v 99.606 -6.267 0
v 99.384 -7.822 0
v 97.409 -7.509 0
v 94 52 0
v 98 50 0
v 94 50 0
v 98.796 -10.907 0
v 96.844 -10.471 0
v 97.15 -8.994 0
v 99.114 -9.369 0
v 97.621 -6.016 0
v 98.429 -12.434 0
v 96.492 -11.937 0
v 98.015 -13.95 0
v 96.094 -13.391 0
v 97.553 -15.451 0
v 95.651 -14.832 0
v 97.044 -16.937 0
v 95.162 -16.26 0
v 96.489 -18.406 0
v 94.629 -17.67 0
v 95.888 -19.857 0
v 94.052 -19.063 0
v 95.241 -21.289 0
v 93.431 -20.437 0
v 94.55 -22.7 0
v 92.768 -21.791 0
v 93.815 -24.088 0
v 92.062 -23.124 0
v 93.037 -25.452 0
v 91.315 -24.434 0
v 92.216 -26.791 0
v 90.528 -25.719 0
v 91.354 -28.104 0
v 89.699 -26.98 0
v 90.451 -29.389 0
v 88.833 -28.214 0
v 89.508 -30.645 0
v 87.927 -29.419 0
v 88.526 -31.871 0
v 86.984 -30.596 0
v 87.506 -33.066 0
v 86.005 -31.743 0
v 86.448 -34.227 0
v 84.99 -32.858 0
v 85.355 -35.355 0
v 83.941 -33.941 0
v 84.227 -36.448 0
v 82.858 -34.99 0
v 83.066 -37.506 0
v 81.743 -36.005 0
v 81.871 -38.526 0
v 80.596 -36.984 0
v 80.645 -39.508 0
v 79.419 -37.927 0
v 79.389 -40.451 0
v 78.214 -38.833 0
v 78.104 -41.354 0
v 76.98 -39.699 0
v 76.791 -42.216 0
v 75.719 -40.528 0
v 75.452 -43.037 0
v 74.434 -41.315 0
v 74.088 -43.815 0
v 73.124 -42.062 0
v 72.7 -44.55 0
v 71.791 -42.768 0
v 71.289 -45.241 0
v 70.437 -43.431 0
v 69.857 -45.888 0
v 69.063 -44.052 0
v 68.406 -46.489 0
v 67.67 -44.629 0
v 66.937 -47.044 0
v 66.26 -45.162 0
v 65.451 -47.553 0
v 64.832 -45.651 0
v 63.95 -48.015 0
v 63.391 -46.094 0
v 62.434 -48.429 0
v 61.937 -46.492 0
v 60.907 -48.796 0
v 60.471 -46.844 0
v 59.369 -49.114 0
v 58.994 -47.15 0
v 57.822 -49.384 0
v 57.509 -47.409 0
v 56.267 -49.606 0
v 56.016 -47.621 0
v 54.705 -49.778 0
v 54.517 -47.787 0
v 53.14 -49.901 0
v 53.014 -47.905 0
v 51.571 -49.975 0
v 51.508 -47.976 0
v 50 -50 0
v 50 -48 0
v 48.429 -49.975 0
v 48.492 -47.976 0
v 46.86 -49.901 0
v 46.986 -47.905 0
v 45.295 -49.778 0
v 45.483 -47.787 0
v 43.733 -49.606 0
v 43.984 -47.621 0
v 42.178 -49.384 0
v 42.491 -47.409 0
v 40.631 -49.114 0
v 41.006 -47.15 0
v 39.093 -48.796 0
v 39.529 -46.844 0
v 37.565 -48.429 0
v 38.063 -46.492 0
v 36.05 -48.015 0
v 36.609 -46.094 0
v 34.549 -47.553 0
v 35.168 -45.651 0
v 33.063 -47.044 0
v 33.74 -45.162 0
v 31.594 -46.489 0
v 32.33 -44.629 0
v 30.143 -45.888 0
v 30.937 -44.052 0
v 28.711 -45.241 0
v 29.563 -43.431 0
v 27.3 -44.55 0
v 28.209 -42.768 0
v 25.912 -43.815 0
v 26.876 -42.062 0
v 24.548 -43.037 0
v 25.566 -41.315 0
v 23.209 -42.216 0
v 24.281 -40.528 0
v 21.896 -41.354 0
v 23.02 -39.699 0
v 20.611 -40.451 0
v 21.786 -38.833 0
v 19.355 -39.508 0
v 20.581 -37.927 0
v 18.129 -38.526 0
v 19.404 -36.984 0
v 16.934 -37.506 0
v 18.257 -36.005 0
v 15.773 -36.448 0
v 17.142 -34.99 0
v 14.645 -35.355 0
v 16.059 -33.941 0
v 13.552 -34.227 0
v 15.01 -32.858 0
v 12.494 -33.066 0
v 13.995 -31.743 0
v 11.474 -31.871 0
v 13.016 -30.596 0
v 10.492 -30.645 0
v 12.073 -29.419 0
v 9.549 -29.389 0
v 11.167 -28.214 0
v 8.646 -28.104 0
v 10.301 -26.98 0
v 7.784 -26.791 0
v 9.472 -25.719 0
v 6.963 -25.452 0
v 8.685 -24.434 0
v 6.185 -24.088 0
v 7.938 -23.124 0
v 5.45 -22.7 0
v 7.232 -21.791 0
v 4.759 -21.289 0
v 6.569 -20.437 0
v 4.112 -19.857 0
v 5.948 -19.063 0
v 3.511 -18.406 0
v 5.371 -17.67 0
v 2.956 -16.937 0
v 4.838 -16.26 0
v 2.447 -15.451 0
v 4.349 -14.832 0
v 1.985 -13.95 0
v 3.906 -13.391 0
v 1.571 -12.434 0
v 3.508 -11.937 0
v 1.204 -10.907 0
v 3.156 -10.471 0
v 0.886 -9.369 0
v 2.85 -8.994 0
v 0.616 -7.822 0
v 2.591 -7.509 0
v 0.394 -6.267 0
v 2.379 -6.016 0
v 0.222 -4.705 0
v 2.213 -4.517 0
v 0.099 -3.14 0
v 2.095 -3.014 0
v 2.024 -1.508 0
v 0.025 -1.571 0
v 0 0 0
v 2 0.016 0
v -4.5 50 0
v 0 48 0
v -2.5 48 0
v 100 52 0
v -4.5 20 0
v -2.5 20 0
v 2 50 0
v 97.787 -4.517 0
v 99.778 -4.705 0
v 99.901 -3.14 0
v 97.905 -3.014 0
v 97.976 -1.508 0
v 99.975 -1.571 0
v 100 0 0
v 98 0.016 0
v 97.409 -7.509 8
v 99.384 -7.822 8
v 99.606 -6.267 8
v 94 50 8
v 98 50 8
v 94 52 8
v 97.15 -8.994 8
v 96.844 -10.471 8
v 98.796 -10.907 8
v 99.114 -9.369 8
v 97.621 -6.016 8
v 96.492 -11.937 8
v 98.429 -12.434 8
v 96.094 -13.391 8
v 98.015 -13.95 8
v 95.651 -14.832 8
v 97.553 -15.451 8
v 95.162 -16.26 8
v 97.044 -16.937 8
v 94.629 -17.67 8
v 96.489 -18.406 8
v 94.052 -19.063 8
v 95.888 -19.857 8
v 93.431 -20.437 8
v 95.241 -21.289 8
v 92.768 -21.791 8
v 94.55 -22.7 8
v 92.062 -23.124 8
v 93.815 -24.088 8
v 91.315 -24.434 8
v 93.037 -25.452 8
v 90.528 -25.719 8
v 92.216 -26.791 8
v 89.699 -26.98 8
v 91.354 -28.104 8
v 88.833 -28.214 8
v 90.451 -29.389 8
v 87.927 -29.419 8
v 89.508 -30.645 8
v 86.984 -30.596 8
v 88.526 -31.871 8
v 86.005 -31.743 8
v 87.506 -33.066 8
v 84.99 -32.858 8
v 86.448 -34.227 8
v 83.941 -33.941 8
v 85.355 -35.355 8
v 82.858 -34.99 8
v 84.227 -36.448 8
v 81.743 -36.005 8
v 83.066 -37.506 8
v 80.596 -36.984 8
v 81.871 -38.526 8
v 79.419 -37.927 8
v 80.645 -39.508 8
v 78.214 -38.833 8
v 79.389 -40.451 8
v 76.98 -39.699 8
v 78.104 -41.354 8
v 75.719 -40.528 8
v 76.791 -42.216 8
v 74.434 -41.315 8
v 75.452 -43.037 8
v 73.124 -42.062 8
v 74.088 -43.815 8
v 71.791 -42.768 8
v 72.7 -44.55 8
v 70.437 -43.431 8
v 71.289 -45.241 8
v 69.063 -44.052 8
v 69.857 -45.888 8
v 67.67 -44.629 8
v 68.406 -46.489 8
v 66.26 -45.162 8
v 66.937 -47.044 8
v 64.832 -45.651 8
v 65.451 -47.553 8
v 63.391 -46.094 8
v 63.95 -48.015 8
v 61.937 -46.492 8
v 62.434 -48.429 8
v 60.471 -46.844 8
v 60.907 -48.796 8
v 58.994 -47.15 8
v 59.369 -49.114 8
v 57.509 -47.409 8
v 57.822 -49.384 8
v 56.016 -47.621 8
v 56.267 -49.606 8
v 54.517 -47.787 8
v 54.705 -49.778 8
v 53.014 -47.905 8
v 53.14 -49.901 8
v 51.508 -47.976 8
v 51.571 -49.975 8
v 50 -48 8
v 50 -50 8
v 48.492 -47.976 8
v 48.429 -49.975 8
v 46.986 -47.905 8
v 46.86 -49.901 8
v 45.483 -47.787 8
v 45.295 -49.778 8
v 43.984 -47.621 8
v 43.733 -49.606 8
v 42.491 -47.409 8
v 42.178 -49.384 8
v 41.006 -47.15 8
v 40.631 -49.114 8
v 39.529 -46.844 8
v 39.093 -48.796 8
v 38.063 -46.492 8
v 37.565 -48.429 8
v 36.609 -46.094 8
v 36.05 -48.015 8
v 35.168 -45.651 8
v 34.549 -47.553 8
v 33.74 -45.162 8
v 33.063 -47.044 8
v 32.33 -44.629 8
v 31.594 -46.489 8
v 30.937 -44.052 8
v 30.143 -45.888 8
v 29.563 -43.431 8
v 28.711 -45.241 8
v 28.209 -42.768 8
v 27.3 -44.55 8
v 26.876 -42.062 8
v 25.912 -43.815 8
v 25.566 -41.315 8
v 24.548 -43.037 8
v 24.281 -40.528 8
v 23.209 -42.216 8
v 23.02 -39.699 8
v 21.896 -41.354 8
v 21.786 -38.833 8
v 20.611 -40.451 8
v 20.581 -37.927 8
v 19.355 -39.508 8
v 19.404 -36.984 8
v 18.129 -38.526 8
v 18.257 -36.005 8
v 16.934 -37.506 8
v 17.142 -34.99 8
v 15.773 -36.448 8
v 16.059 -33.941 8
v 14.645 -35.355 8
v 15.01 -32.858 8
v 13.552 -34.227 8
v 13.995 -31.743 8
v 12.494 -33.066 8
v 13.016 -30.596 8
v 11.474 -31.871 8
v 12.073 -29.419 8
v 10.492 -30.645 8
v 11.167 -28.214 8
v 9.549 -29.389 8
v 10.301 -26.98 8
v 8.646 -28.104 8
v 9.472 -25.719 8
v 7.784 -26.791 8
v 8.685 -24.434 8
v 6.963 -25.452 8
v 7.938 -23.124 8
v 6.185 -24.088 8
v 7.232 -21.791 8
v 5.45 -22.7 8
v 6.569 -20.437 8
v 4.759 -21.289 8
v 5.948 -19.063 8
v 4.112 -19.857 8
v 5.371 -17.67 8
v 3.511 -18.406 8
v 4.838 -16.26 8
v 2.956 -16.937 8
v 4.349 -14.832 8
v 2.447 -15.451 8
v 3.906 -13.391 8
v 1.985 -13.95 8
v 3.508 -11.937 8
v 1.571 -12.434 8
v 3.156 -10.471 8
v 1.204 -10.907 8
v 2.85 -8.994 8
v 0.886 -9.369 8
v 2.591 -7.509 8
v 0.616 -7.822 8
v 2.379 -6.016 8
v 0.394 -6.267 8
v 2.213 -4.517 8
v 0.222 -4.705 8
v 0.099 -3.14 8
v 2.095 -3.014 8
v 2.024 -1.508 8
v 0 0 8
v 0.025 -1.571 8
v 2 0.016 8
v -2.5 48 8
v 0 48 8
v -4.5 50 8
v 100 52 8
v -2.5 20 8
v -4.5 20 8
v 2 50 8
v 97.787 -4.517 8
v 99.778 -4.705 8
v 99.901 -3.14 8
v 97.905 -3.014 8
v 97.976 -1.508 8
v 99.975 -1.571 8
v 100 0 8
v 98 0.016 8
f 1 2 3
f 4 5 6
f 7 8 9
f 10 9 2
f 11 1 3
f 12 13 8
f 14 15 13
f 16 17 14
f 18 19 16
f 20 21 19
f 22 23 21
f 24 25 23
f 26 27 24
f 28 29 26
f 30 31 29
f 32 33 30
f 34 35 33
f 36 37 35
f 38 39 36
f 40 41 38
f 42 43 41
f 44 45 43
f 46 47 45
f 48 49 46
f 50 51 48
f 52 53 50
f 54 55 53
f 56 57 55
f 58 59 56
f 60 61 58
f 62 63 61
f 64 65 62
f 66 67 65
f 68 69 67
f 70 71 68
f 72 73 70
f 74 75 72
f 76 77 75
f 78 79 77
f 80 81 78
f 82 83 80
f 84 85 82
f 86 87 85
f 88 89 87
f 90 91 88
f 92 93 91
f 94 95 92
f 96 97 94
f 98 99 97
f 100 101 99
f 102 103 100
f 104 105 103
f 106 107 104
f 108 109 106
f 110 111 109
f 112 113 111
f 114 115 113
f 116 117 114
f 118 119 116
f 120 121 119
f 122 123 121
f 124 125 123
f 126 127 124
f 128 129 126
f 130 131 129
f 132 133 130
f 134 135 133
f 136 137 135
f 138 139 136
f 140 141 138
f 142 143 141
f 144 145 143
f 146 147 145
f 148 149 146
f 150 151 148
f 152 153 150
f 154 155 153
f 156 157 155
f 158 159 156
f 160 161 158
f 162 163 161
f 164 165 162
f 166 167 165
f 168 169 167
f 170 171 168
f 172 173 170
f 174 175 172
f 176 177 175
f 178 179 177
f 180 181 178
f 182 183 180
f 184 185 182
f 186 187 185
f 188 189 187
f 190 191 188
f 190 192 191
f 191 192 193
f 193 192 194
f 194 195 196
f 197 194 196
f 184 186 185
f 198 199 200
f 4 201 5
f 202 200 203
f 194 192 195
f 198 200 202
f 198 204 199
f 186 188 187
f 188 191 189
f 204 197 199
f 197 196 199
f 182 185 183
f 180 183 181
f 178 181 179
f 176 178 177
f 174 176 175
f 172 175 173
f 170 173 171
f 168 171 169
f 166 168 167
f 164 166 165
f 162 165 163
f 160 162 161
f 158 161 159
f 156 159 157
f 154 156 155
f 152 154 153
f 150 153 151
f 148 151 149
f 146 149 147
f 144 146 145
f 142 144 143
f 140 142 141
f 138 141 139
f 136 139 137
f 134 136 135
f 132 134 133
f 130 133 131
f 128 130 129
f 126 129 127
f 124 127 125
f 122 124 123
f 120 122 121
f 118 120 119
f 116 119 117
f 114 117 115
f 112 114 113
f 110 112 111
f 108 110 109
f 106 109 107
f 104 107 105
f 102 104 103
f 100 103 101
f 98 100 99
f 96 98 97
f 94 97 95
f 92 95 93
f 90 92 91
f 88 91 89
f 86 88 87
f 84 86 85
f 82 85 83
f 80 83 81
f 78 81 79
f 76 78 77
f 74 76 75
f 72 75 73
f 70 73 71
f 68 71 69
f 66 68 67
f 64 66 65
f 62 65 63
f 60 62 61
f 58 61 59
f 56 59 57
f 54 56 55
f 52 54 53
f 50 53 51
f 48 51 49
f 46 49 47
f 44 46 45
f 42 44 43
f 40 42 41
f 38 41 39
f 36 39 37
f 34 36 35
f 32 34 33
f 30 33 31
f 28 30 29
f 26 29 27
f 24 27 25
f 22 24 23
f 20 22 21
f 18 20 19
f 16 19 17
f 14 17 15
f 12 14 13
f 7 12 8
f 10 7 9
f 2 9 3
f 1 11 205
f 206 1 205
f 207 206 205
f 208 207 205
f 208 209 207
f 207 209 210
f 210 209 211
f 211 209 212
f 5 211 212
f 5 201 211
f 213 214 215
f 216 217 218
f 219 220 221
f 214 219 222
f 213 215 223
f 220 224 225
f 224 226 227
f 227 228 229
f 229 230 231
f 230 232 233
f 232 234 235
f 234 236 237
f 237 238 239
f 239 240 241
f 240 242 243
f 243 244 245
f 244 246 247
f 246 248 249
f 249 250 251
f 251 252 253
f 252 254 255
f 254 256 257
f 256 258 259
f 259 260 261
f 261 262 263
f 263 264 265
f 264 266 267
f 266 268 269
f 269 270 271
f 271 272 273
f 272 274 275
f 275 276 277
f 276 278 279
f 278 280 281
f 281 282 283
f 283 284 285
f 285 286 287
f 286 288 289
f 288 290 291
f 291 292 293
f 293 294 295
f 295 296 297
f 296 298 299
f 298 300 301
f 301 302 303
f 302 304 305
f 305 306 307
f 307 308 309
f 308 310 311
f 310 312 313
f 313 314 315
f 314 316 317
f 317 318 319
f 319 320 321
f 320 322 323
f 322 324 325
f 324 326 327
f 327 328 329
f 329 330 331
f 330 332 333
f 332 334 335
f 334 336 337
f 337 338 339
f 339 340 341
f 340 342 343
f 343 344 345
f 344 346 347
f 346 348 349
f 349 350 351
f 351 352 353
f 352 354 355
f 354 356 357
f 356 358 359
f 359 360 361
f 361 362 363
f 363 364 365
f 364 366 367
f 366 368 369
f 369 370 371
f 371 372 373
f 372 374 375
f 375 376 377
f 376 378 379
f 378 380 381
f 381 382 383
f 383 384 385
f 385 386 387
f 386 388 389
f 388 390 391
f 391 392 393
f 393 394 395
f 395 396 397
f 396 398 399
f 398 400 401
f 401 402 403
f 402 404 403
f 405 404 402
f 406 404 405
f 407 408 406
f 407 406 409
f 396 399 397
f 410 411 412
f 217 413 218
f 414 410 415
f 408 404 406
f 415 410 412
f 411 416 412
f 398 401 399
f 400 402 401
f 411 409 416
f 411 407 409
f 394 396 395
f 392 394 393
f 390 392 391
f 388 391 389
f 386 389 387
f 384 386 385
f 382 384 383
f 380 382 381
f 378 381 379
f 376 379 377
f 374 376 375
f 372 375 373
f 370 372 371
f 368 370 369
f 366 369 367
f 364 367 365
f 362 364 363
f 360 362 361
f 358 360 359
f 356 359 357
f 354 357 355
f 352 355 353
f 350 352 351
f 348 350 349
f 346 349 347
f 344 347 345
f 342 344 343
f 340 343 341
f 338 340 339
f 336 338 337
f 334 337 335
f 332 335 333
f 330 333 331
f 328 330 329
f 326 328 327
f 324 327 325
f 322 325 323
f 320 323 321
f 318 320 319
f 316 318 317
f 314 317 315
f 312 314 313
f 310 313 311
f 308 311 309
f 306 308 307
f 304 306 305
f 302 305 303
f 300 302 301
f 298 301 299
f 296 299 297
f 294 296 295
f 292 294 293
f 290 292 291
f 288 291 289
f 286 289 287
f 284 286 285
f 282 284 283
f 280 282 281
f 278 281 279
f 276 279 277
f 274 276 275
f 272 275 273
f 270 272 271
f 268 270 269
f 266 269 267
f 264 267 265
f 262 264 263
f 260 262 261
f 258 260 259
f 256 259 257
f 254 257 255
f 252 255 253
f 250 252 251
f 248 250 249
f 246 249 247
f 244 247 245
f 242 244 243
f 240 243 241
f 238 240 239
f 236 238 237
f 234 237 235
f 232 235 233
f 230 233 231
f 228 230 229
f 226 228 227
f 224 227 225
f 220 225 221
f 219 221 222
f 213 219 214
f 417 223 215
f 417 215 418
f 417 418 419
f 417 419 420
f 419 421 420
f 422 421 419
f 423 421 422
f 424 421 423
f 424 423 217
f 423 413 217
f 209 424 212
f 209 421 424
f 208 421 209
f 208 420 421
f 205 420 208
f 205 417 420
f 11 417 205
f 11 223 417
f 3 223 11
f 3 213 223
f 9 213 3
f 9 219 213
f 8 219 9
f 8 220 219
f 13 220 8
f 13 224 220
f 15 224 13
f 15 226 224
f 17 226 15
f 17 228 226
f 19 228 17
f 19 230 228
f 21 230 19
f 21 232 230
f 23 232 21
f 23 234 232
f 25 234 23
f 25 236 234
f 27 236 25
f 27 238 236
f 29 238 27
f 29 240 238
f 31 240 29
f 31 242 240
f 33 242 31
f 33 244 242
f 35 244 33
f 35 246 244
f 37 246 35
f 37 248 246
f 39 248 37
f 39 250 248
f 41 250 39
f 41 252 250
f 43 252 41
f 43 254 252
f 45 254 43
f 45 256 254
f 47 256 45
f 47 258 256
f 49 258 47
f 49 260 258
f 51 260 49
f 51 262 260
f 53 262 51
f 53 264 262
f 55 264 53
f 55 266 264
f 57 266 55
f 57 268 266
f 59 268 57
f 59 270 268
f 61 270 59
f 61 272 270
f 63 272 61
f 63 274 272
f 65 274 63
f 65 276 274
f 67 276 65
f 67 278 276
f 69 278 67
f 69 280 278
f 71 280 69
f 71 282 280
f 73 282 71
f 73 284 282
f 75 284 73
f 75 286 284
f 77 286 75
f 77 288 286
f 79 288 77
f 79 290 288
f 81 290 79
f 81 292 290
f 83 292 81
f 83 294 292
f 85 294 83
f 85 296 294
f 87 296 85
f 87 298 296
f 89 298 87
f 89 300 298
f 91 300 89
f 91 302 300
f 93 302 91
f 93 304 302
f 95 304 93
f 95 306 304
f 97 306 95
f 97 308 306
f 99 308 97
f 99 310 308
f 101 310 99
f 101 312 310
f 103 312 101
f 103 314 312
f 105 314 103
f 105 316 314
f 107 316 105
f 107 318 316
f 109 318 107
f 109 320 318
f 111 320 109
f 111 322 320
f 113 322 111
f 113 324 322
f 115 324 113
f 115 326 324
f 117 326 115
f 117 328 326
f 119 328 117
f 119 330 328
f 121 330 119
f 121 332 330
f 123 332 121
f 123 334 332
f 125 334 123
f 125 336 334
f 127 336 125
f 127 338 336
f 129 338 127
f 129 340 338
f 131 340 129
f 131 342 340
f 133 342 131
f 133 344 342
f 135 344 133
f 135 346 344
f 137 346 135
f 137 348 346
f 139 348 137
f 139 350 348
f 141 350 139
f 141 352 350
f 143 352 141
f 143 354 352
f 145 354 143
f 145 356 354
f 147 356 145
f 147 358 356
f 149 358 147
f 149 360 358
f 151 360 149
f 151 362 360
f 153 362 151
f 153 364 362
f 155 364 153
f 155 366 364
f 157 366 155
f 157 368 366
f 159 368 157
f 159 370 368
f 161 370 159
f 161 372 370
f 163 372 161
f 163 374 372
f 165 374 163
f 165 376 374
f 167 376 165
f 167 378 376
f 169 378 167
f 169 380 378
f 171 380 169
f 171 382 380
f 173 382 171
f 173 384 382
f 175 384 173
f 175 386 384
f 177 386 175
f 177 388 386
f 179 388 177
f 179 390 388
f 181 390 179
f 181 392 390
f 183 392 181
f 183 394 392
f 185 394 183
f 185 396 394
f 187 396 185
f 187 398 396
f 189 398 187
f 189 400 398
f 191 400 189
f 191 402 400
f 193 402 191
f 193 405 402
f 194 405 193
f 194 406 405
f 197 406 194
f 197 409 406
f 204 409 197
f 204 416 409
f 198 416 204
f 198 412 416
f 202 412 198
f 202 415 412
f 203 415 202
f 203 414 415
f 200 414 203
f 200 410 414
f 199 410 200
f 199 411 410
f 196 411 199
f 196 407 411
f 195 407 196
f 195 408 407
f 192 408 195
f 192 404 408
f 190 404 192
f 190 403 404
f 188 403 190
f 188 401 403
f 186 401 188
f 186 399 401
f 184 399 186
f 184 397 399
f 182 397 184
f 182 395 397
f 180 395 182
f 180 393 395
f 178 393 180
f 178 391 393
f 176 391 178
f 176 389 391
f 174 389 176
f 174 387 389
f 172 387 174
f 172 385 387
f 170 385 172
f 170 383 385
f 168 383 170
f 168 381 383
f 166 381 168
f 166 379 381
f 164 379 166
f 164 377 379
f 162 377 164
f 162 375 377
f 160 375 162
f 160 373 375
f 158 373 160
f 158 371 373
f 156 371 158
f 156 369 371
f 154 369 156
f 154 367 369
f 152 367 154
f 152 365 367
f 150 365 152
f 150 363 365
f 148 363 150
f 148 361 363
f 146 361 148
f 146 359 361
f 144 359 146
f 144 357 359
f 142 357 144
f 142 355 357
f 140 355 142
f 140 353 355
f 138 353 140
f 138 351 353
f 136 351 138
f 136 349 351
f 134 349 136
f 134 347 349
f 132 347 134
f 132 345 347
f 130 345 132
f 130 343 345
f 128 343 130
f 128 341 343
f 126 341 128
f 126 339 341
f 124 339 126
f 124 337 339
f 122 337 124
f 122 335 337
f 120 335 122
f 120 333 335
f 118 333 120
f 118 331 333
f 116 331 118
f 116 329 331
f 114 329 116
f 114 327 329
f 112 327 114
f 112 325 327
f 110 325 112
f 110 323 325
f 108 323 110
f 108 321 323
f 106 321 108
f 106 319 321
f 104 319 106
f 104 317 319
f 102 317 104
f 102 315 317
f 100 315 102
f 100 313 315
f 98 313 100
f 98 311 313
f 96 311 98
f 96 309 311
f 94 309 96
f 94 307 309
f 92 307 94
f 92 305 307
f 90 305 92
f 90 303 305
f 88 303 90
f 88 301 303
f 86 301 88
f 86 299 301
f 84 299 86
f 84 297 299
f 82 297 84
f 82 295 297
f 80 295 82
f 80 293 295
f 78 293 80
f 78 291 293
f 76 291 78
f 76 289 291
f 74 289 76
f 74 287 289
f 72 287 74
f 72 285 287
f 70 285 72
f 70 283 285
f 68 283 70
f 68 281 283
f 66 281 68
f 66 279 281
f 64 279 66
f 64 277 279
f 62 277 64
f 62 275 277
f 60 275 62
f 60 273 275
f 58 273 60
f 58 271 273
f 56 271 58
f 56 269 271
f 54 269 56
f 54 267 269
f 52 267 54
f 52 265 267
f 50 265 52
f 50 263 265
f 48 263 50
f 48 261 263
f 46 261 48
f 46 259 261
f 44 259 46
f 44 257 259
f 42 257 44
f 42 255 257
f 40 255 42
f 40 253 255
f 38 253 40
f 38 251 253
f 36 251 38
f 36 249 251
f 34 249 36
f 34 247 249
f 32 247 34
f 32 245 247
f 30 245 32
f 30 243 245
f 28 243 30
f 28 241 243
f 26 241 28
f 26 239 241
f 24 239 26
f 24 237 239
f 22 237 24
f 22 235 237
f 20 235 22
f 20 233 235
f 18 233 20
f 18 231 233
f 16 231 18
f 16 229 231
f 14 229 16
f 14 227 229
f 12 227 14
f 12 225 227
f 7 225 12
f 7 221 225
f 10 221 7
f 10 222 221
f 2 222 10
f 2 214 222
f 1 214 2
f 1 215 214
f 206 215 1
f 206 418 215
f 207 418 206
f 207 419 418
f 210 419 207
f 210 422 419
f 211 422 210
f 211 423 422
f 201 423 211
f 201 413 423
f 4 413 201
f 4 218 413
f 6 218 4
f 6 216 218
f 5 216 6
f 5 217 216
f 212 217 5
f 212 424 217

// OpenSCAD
$fn = 200;
gap_width = 2.5;

module shape() {
  square([100, 100]);
  translate([50, 0]) circle(r = 50);
}

module outline() {
  translate([-2 - gap_width, 20]) square([2, 30]);
  translate([-gap_width, 48]) square([gap_width, 2]);
  translate([94, 50]) square([6, 2]);
  difference() {
    shape();
    offset(delta = -2)
      shape();
    translate([0, 50])
      square([100, 100]);
  }
}

linear_extrude(8) {
  outline();
}
  // sphere(2);
